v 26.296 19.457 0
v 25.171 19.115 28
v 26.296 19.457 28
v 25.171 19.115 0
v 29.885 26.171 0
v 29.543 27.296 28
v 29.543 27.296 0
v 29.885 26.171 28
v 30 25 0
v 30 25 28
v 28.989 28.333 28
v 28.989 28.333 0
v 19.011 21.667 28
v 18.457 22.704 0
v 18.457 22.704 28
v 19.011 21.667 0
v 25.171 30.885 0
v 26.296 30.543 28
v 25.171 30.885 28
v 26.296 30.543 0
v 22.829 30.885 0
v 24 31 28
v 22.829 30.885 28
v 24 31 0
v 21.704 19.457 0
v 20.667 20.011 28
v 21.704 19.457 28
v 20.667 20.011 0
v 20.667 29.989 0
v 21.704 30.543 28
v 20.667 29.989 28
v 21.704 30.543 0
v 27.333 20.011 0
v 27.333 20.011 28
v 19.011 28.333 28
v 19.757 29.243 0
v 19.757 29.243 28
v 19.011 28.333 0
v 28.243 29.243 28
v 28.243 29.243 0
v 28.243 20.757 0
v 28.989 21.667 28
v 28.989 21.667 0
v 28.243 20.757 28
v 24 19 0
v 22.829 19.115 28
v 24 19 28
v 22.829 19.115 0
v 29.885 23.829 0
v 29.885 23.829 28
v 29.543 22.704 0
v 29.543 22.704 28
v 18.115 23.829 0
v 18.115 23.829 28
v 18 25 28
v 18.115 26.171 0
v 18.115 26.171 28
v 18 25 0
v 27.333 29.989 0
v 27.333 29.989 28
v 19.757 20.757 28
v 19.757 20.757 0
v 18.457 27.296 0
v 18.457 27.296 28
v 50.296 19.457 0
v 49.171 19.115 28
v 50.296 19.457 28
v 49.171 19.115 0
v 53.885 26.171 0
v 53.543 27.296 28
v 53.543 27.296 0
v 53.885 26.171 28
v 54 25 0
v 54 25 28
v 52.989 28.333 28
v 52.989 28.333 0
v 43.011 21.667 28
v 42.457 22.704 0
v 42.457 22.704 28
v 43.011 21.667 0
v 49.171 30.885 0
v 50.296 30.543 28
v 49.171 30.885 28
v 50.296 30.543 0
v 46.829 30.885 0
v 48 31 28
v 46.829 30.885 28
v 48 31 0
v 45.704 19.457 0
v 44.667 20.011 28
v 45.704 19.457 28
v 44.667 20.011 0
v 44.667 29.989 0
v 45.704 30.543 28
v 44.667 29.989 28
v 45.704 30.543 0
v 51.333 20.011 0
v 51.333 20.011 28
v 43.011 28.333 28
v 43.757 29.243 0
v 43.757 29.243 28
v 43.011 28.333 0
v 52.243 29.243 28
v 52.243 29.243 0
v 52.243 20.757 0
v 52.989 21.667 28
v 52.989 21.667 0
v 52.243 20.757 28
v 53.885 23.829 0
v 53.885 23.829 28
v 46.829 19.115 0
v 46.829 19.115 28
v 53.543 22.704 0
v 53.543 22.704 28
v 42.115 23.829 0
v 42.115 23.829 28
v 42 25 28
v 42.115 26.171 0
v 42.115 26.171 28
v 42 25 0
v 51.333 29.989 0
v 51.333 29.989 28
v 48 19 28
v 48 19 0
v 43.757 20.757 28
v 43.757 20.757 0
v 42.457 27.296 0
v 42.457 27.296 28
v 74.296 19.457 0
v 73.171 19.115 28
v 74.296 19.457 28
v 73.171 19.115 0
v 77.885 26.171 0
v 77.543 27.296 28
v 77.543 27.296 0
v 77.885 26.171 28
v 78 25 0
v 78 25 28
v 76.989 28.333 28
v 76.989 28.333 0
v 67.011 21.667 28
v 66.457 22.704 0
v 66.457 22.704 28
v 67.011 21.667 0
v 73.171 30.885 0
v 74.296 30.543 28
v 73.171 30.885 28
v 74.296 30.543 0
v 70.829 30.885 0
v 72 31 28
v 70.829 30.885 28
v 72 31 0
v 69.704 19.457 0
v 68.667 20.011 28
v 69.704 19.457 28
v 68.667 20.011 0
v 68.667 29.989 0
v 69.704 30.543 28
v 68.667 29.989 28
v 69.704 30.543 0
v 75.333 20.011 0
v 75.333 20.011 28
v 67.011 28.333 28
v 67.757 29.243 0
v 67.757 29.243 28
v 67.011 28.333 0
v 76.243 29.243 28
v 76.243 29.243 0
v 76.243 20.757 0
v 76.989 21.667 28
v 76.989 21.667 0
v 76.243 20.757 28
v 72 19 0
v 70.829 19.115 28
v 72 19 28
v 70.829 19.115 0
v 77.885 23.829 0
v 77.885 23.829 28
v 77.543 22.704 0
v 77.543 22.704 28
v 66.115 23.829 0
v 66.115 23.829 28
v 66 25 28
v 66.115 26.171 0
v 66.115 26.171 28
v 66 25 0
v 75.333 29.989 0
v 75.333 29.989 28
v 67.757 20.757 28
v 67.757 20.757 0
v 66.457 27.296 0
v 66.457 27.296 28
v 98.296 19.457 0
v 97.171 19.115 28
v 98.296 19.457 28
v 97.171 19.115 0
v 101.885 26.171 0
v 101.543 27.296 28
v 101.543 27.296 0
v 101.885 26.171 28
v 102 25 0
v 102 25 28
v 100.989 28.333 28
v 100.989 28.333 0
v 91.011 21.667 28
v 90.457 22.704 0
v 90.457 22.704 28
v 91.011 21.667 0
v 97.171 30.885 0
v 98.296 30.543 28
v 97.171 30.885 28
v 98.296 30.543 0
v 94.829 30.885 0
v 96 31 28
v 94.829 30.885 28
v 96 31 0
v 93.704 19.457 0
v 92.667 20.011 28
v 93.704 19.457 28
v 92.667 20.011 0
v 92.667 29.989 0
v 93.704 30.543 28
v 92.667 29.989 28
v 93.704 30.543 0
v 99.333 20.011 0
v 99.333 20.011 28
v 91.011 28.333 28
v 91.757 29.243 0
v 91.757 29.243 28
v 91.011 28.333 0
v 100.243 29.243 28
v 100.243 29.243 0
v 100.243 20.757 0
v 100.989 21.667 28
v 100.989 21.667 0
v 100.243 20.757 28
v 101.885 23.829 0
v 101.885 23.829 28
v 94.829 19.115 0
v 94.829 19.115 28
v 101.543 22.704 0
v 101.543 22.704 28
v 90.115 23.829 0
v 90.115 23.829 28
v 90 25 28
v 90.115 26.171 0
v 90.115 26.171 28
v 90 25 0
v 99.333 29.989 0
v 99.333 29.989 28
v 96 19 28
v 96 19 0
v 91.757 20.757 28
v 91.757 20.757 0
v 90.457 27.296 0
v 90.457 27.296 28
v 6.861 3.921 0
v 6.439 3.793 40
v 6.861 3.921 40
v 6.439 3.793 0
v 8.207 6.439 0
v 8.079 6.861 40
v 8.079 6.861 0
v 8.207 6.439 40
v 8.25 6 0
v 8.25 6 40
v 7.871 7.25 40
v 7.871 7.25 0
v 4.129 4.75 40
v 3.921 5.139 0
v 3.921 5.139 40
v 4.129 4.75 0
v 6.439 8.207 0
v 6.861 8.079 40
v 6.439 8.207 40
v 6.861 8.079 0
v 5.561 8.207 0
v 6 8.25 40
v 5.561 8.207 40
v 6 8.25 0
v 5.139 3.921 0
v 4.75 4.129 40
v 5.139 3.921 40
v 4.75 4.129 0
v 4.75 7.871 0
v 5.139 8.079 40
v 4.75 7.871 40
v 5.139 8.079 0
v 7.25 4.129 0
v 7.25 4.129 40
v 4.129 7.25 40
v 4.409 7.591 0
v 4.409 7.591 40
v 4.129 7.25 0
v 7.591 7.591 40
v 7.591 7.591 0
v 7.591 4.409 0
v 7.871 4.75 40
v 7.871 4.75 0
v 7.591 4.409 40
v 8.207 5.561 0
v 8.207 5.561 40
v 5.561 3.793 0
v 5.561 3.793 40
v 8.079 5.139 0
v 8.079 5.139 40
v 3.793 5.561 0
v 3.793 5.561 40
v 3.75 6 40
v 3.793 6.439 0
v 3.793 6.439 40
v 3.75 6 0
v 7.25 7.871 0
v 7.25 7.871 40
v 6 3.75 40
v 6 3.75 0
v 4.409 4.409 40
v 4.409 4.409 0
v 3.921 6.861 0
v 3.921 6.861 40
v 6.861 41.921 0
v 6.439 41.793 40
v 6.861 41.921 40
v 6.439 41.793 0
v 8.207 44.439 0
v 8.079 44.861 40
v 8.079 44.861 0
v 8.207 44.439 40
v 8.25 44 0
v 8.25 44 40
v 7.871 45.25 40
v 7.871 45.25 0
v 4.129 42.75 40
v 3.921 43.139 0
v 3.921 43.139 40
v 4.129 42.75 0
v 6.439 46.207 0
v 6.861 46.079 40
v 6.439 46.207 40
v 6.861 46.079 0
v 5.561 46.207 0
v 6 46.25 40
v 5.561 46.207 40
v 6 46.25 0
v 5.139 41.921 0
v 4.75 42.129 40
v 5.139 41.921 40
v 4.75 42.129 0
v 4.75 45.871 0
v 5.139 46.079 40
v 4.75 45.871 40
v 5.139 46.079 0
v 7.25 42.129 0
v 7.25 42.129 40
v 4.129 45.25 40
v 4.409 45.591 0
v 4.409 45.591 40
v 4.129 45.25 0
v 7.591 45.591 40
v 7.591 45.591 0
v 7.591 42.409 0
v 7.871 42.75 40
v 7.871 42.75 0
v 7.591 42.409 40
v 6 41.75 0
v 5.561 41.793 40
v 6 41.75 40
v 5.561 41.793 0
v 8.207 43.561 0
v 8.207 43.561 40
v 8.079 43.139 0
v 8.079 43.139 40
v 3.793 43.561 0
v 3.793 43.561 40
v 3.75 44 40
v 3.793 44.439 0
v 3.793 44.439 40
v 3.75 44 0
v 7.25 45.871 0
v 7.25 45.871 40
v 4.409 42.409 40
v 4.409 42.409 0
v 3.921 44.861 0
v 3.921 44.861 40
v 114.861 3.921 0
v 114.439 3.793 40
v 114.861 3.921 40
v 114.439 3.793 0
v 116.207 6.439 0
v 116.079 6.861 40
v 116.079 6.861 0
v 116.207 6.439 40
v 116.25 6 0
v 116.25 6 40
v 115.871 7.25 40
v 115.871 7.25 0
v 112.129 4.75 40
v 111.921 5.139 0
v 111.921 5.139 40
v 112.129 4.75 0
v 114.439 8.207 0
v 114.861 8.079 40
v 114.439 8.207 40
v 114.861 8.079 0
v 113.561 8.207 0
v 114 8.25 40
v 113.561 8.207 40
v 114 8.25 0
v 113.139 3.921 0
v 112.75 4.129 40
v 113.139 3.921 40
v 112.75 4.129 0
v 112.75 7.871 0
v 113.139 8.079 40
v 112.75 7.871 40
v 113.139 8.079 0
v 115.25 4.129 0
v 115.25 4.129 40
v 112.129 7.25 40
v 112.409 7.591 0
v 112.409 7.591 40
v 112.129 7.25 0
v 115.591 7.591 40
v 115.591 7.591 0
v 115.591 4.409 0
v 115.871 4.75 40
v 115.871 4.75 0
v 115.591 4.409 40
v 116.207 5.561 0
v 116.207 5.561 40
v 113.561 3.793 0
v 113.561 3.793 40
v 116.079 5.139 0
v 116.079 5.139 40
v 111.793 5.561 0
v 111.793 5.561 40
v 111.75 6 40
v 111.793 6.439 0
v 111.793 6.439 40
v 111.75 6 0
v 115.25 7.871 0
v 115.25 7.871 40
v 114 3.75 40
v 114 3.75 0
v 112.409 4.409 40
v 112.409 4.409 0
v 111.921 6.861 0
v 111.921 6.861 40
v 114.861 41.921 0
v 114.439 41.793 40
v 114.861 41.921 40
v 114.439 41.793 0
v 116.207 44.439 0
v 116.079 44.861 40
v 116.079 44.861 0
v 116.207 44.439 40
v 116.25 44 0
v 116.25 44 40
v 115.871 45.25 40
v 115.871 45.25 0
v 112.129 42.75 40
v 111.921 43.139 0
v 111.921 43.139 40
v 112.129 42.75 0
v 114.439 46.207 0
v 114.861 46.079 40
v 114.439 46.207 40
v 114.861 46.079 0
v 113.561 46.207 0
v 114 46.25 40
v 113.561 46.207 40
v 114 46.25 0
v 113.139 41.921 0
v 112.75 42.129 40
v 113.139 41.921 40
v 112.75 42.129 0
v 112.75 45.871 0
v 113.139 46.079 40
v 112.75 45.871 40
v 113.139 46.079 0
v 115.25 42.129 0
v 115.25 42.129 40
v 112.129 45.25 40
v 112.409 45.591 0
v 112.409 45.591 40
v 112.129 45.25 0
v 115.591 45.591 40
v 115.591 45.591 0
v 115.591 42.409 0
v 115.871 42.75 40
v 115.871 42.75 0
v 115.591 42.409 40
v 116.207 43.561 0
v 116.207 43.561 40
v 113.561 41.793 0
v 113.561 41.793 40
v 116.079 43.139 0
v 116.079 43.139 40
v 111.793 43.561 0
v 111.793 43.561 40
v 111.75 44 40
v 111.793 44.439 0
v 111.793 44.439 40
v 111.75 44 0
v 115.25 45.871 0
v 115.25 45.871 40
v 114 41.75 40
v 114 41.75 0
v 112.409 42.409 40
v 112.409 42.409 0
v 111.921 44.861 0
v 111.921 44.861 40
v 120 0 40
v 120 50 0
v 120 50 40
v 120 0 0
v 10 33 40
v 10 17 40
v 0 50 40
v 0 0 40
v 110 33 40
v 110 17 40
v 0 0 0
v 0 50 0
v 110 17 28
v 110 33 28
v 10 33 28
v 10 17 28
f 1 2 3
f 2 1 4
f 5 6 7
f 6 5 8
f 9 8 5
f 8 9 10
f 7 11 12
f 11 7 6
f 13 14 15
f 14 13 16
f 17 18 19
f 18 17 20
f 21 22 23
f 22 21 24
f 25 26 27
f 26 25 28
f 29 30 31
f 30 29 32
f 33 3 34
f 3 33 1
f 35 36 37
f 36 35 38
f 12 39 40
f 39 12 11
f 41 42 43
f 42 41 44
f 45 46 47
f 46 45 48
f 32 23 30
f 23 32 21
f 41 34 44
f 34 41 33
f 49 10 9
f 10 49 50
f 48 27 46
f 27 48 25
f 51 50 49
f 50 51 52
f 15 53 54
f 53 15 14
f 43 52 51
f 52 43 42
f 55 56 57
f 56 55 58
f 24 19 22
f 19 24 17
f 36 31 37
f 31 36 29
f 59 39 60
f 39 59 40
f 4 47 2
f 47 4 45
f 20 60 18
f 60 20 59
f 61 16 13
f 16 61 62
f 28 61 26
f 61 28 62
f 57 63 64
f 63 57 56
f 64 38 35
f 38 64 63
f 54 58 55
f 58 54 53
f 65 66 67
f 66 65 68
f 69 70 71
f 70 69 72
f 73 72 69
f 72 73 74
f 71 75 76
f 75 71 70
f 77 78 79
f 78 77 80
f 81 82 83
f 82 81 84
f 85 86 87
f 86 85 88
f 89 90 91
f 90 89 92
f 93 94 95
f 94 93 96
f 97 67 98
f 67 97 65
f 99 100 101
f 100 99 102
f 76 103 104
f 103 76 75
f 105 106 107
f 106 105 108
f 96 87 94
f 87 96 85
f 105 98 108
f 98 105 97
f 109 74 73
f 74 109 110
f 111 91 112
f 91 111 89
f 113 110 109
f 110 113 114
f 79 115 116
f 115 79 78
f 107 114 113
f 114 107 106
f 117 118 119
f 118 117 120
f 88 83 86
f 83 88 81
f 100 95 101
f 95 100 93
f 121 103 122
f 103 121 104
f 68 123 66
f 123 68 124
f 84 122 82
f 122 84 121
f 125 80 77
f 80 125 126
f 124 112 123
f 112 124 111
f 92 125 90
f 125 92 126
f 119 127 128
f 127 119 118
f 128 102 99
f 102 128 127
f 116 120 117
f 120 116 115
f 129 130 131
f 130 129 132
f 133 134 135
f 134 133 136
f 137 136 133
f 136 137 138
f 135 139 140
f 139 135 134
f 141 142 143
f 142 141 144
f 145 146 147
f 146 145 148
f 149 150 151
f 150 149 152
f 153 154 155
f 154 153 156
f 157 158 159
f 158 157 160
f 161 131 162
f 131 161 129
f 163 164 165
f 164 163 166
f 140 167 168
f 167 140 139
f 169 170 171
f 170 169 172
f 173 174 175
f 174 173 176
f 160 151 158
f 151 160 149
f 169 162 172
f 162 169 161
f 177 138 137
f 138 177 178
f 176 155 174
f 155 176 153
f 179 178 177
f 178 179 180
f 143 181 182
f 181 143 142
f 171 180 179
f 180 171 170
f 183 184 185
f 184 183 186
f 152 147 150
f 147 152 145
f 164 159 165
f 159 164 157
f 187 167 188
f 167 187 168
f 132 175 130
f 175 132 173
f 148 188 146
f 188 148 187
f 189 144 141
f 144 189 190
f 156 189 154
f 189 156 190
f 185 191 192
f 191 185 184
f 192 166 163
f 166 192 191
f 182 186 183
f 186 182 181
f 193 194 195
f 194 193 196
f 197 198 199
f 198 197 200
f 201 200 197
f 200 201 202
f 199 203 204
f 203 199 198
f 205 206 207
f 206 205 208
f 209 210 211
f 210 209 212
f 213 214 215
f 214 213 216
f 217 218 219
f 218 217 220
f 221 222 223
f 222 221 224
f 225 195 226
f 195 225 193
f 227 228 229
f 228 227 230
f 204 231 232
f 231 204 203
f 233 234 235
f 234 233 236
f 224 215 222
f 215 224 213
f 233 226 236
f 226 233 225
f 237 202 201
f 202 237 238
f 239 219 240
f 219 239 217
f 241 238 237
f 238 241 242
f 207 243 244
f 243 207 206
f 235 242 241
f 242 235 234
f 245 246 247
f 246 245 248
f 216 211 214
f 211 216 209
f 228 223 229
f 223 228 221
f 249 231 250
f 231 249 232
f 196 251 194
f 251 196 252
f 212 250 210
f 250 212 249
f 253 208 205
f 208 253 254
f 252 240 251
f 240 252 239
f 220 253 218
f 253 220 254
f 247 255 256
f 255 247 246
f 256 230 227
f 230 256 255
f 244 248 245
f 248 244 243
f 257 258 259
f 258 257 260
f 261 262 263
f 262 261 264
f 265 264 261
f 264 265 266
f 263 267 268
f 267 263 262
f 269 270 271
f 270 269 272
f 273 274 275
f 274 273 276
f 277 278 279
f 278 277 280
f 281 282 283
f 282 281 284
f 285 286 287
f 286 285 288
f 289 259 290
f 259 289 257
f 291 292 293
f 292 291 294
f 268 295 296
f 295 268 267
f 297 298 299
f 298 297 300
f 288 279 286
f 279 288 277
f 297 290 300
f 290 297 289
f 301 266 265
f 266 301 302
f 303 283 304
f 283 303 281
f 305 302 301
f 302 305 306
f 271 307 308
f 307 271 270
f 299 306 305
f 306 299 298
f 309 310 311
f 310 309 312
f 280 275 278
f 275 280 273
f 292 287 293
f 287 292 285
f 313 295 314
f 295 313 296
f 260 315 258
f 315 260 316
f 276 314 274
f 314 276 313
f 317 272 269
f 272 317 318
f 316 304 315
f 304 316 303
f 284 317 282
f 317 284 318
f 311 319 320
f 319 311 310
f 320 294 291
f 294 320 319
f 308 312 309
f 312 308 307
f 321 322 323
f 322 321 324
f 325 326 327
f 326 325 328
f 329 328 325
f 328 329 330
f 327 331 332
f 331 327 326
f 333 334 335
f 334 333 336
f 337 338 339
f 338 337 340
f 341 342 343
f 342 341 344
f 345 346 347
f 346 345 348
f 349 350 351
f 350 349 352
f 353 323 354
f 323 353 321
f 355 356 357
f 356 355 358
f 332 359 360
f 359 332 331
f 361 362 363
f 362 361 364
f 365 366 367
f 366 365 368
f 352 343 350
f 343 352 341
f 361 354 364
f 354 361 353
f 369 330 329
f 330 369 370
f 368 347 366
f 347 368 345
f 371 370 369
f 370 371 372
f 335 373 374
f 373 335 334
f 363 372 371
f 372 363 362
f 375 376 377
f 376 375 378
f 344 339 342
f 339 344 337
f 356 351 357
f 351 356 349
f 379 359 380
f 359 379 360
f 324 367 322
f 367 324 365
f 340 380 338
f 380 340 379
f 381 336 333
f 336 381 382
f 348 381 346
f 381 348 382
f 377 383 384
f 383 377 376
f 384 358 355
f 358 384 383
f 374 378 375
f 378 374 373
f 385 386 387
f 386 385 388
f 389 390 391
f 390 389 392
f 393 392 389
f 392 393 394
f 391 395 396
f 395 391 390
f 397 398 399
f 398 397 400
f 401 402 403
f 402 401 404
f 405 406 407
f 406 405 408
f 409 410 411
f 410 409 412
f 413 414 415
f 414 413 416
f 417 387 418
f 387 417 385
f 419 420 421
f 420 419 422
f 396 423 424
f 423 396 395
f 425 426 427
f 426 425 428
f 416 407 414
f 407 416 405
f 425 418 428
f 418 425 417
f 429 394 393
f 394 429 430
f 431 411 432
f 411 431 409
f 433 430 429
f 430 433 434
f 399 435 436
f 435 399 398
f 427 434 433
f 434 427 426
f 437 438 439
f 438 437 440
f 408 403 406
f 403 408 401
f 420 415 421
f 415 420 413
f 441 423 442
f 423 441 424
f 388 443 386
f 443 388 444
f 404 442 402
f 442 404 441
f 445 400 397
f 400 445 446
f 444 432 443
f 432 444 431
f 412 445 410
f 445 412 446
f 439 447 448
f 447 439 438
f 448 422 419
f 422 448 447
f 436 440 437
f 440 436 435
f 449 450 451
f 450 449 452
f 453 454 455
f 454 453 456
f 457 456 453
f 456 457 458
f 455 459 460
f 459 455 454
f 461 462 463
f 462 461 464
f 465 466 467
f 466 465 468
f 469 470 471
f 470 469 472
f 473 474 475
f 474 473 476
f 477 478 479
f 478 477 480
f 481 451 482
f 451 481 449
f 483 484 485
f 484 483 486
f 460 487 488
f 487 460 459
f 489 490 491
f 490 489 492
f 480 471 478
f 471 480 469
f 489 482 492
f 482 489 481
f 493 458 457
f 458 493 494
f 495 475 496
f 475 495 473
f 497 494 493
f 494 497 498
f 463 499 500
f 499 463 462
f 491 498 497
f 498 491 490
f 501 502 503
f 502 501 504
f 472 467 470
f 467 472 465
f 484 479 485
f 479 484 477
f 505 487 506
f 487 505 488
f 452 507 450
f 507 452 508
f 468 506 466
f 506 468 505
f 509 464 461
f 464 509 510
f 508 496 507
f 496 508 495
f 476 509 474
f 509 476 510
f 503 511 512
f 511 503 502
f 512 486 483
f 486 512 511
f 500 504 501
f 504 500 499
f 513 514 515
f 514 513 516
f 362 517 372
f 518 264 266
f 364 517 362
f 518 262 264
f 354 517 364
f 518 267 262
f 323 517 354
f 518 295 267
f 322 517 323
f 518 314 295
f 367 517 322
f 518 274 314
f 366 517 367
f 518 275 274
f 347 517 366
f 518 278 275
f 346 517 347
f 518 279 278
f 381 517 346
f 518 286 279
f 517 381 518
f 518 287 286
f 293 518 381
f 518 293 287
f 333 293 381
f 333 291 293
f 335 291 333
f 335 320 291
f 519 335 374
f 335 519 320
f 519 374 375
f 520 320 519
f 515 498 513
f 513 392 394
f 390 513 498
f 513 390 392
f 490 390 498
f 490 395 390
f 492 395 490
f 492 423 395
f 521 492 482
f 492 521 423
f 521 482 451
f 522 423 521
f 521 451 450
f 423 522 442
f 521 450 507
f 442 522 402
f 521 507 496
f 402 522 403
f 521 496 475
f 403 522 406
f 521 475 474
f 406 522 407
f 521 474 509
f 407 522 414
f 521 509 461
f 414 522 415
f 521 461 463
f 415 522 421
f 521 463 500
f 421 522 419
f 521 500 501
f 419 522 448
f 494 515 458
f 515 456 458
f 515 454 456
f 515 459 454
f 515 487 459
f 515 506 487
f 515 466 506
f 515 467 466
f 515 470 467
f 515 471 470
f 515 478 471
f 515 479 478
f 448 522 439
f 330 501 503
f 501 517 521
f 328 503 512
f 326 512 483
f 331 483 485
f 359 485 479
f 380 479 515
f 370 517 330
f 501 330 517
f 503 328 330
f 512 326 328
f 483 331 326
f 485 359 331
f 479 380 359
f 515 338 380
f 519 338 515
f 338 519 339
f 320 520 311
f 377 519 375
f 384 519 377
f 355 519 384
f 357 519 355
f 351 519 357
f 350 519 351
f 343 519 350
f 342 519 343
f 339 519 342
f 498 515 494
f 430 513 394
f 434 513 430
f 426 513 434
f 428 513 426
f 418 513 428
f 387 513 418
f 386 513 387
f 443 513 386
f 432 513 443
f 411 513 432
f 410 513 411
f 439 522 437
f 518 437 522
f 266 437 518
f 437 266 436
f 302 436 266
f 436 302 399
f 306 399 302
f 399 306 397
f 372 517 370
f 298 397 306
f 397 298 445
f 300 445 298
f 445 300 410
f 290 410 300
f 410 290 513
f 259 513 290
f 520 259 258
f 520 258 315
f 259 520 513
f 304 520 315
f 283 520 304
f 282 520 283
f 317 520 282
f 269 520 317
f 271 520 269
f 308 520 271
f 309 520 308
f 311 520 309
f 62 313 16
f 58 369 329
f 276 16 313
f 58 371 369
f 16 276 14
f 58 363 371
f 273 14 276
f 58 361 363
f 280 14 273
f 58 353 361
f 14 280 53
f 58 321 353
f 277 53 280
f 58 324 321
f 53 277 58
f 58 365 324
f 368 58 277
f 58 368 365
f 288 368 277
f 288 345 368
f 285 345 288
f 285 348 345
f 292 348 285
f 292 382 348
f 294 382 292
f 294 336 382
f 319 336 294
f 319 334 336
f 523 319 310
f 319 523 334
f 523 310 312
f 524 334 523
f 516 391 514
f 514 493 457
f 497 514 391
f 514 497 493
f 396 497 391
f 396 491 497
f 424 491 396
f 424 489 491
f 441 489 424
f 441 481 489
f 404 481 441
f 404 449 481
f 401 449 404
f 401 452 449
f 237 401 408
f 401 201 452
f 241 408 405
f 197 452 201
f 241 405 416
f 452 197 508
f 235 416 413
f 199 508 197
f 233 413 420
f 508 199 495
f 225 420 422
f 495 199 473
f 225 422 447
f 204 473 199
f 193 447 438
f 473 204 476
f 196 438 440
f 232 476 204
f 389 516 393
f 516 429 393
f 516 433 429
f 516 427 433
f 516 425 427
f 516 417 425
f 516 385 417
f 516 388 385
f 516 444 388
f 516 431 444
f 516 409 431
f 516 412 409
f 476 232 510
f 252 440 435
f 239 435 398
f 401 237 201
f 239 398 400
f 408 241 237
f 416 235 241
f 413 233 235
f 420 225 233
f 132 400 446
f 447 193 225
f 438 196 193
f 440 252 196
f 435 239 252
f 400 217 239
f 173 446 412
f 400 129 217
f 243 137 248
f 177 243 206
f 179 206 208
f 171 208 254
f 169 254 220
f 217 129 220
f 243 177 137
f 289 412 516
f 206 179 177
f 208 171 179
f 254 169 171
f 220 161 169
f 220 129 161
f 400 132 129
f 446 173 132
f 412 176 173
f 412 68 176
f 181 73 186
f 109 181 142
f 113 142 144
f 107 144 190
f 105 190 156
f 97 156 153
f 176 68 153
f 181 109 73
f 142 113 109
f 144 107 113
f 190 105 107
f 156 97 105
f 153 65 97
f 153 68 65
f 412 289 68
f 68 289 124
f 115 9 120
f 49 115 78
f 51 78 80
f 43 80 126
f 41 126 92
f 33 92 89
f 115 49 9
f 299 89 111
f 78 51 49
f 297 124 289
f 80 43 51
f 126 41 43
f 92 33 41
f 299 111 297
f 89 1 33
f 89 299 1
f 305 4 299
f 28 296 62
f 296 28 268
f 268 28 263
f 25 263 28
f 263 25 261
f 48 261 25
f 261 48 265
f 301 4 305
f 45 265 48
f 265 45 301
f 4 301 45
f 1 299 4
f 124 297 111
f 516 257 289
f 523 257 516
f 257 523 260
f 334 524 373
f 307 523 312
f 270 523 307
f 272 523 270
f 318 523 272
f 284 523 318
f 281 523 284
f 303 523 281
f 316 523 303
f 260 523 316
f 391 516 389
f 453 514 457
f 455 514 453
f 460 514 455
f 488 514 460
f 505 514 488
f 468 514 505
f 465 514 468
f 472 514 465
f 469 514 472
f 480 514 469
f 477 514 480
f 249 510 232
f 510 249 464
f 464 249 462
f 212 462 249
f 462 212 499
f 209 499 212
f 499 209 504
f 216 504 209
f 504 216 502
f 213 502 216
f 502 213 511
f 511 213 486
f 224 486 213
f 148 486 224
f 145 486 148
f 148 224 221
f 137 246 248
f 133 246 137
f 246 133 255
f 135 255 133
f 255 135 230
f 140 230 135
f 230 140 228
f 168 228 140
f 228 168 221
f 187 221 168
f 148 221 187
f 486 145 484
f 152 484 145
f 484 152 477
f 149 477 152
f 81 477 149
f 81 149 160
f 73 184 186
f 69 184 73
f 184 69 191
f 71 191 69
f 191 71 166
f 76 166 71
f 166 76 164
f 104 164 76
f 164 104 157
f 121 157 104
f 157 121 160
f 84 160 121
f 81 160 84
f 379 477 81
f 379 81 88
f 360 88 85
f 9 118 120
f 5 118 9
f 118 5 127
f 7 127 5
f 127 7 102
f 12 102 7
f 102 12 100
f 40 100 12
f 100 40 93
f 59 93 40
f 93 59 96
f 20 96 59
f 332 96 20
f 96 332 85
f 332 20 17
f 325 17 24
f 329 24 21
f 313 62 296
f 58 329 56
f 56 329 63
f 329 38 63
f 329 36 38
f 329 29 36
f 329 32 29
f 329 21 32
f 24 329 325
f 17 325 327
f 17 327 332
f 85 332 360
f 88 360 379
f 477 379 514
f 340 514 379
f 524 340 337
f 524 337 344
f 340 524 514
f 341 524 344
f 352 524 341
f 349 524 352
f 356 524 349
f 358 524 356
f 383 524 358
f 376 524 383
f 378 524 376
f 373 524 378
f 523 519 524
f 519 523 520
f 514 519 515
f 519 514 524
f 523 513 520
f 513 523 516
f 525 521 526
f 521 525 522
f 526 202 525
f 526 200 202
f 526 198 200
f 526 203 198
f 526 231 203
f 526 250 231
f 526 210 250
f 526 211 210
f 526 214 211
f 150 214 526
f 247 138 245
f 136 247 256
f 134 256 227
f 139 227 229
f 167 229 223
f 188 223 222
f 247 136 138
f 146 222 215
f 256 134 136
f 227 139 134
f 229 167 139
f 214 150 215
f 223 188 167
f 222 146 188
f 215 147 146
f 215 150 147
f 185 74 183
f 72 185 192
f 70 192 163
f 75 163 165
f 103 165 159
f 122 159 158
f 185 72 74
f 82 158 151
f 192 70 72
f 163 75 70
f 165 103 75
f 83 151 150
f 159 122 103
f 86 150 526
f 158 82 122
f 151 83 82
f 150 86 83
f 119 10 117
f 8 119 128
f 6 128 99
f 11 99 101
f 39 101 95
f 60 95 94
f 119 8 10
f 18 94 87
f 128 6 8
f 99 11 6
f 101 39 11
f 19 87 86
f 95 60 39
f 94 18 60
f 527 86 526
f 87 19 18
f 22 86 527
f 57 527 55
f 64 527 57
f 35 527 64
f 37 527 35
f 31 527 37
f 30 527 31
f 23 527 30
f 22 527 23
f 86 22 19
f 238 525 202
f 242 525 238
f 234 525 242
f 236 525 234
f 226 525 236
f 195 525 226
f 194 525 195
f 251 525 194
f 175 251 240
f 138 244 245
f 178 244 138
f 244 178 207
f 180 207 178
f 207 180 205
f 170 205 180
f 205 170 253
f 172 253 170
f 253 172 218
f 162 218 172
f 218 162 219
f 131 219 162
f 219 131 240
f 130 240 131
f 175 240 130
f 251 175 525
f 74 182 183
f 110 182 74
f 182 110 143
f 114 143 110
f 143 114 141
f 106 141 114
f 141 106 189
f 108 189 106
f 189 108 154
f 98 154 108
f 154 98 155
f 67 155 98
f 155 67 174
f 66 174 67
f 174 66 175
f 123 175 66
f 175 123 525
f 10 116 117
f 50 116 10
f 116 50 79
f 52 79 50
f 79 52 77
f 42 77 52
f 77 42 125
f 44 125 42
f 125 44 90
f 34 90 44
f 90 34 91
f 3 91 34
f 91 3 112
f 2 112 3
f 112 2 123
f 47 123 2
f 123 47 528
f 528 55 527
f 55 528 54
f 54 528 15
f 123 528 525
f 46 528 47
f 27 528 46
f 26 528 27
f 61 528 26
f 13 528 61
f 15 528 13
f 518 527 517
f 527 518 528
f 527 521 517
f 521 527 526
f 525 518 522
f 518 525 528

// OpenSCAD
$fn = 32;

// ----------------------------------------------------------------------
// Manifold block: gallery_top manifold
// ----------------------------------------------------------------------

// --- parameters (mm) ---
block_l = 120;            // block length, X
block_w = 50;             // block width, Y
block_h = 40;             // block height, Z
port_d = 12;              // port bore diameter
port_pitch = 24;          // port pitch along X
gallery_d = 16;           // top gallery width, Y
gallery_depth = 12;       // gallery pocket depth
wall_p = 10;              // gallery end wall thickness, X
mnt_d = 4.5;              // mounting hole diameter
mnt_in = 6;               // mounting hole inset from the edges

n_ports = 4;  // ports in the row
port_x0 = (block_l - (n_ports - 1) * port_pitch) / 2;  // first port X

difference() {
  cube([block_l, block_w, block_h]);
  for (i = [0 : n_ports - 1])
    translate([port_x0 + i * port_pitch, block_w / 2, -1])
      cylinder(h = block_h + 2, d = port_d);
  translate([wall_p, block_w / 2 - gallery_d / 2, block_h - gallery_depth])
    cube([block_l - 2 * wall_p, gallery_d, gallery_depth + 1]);
  for (cx = [mnt_in, block_l - mnt_in])
    for (cy = [mnt_in, block_w - mnt_in])
      translate([cx, cy, -1]) cylinder(h = block_h + 2, d = mnt_d);
}
